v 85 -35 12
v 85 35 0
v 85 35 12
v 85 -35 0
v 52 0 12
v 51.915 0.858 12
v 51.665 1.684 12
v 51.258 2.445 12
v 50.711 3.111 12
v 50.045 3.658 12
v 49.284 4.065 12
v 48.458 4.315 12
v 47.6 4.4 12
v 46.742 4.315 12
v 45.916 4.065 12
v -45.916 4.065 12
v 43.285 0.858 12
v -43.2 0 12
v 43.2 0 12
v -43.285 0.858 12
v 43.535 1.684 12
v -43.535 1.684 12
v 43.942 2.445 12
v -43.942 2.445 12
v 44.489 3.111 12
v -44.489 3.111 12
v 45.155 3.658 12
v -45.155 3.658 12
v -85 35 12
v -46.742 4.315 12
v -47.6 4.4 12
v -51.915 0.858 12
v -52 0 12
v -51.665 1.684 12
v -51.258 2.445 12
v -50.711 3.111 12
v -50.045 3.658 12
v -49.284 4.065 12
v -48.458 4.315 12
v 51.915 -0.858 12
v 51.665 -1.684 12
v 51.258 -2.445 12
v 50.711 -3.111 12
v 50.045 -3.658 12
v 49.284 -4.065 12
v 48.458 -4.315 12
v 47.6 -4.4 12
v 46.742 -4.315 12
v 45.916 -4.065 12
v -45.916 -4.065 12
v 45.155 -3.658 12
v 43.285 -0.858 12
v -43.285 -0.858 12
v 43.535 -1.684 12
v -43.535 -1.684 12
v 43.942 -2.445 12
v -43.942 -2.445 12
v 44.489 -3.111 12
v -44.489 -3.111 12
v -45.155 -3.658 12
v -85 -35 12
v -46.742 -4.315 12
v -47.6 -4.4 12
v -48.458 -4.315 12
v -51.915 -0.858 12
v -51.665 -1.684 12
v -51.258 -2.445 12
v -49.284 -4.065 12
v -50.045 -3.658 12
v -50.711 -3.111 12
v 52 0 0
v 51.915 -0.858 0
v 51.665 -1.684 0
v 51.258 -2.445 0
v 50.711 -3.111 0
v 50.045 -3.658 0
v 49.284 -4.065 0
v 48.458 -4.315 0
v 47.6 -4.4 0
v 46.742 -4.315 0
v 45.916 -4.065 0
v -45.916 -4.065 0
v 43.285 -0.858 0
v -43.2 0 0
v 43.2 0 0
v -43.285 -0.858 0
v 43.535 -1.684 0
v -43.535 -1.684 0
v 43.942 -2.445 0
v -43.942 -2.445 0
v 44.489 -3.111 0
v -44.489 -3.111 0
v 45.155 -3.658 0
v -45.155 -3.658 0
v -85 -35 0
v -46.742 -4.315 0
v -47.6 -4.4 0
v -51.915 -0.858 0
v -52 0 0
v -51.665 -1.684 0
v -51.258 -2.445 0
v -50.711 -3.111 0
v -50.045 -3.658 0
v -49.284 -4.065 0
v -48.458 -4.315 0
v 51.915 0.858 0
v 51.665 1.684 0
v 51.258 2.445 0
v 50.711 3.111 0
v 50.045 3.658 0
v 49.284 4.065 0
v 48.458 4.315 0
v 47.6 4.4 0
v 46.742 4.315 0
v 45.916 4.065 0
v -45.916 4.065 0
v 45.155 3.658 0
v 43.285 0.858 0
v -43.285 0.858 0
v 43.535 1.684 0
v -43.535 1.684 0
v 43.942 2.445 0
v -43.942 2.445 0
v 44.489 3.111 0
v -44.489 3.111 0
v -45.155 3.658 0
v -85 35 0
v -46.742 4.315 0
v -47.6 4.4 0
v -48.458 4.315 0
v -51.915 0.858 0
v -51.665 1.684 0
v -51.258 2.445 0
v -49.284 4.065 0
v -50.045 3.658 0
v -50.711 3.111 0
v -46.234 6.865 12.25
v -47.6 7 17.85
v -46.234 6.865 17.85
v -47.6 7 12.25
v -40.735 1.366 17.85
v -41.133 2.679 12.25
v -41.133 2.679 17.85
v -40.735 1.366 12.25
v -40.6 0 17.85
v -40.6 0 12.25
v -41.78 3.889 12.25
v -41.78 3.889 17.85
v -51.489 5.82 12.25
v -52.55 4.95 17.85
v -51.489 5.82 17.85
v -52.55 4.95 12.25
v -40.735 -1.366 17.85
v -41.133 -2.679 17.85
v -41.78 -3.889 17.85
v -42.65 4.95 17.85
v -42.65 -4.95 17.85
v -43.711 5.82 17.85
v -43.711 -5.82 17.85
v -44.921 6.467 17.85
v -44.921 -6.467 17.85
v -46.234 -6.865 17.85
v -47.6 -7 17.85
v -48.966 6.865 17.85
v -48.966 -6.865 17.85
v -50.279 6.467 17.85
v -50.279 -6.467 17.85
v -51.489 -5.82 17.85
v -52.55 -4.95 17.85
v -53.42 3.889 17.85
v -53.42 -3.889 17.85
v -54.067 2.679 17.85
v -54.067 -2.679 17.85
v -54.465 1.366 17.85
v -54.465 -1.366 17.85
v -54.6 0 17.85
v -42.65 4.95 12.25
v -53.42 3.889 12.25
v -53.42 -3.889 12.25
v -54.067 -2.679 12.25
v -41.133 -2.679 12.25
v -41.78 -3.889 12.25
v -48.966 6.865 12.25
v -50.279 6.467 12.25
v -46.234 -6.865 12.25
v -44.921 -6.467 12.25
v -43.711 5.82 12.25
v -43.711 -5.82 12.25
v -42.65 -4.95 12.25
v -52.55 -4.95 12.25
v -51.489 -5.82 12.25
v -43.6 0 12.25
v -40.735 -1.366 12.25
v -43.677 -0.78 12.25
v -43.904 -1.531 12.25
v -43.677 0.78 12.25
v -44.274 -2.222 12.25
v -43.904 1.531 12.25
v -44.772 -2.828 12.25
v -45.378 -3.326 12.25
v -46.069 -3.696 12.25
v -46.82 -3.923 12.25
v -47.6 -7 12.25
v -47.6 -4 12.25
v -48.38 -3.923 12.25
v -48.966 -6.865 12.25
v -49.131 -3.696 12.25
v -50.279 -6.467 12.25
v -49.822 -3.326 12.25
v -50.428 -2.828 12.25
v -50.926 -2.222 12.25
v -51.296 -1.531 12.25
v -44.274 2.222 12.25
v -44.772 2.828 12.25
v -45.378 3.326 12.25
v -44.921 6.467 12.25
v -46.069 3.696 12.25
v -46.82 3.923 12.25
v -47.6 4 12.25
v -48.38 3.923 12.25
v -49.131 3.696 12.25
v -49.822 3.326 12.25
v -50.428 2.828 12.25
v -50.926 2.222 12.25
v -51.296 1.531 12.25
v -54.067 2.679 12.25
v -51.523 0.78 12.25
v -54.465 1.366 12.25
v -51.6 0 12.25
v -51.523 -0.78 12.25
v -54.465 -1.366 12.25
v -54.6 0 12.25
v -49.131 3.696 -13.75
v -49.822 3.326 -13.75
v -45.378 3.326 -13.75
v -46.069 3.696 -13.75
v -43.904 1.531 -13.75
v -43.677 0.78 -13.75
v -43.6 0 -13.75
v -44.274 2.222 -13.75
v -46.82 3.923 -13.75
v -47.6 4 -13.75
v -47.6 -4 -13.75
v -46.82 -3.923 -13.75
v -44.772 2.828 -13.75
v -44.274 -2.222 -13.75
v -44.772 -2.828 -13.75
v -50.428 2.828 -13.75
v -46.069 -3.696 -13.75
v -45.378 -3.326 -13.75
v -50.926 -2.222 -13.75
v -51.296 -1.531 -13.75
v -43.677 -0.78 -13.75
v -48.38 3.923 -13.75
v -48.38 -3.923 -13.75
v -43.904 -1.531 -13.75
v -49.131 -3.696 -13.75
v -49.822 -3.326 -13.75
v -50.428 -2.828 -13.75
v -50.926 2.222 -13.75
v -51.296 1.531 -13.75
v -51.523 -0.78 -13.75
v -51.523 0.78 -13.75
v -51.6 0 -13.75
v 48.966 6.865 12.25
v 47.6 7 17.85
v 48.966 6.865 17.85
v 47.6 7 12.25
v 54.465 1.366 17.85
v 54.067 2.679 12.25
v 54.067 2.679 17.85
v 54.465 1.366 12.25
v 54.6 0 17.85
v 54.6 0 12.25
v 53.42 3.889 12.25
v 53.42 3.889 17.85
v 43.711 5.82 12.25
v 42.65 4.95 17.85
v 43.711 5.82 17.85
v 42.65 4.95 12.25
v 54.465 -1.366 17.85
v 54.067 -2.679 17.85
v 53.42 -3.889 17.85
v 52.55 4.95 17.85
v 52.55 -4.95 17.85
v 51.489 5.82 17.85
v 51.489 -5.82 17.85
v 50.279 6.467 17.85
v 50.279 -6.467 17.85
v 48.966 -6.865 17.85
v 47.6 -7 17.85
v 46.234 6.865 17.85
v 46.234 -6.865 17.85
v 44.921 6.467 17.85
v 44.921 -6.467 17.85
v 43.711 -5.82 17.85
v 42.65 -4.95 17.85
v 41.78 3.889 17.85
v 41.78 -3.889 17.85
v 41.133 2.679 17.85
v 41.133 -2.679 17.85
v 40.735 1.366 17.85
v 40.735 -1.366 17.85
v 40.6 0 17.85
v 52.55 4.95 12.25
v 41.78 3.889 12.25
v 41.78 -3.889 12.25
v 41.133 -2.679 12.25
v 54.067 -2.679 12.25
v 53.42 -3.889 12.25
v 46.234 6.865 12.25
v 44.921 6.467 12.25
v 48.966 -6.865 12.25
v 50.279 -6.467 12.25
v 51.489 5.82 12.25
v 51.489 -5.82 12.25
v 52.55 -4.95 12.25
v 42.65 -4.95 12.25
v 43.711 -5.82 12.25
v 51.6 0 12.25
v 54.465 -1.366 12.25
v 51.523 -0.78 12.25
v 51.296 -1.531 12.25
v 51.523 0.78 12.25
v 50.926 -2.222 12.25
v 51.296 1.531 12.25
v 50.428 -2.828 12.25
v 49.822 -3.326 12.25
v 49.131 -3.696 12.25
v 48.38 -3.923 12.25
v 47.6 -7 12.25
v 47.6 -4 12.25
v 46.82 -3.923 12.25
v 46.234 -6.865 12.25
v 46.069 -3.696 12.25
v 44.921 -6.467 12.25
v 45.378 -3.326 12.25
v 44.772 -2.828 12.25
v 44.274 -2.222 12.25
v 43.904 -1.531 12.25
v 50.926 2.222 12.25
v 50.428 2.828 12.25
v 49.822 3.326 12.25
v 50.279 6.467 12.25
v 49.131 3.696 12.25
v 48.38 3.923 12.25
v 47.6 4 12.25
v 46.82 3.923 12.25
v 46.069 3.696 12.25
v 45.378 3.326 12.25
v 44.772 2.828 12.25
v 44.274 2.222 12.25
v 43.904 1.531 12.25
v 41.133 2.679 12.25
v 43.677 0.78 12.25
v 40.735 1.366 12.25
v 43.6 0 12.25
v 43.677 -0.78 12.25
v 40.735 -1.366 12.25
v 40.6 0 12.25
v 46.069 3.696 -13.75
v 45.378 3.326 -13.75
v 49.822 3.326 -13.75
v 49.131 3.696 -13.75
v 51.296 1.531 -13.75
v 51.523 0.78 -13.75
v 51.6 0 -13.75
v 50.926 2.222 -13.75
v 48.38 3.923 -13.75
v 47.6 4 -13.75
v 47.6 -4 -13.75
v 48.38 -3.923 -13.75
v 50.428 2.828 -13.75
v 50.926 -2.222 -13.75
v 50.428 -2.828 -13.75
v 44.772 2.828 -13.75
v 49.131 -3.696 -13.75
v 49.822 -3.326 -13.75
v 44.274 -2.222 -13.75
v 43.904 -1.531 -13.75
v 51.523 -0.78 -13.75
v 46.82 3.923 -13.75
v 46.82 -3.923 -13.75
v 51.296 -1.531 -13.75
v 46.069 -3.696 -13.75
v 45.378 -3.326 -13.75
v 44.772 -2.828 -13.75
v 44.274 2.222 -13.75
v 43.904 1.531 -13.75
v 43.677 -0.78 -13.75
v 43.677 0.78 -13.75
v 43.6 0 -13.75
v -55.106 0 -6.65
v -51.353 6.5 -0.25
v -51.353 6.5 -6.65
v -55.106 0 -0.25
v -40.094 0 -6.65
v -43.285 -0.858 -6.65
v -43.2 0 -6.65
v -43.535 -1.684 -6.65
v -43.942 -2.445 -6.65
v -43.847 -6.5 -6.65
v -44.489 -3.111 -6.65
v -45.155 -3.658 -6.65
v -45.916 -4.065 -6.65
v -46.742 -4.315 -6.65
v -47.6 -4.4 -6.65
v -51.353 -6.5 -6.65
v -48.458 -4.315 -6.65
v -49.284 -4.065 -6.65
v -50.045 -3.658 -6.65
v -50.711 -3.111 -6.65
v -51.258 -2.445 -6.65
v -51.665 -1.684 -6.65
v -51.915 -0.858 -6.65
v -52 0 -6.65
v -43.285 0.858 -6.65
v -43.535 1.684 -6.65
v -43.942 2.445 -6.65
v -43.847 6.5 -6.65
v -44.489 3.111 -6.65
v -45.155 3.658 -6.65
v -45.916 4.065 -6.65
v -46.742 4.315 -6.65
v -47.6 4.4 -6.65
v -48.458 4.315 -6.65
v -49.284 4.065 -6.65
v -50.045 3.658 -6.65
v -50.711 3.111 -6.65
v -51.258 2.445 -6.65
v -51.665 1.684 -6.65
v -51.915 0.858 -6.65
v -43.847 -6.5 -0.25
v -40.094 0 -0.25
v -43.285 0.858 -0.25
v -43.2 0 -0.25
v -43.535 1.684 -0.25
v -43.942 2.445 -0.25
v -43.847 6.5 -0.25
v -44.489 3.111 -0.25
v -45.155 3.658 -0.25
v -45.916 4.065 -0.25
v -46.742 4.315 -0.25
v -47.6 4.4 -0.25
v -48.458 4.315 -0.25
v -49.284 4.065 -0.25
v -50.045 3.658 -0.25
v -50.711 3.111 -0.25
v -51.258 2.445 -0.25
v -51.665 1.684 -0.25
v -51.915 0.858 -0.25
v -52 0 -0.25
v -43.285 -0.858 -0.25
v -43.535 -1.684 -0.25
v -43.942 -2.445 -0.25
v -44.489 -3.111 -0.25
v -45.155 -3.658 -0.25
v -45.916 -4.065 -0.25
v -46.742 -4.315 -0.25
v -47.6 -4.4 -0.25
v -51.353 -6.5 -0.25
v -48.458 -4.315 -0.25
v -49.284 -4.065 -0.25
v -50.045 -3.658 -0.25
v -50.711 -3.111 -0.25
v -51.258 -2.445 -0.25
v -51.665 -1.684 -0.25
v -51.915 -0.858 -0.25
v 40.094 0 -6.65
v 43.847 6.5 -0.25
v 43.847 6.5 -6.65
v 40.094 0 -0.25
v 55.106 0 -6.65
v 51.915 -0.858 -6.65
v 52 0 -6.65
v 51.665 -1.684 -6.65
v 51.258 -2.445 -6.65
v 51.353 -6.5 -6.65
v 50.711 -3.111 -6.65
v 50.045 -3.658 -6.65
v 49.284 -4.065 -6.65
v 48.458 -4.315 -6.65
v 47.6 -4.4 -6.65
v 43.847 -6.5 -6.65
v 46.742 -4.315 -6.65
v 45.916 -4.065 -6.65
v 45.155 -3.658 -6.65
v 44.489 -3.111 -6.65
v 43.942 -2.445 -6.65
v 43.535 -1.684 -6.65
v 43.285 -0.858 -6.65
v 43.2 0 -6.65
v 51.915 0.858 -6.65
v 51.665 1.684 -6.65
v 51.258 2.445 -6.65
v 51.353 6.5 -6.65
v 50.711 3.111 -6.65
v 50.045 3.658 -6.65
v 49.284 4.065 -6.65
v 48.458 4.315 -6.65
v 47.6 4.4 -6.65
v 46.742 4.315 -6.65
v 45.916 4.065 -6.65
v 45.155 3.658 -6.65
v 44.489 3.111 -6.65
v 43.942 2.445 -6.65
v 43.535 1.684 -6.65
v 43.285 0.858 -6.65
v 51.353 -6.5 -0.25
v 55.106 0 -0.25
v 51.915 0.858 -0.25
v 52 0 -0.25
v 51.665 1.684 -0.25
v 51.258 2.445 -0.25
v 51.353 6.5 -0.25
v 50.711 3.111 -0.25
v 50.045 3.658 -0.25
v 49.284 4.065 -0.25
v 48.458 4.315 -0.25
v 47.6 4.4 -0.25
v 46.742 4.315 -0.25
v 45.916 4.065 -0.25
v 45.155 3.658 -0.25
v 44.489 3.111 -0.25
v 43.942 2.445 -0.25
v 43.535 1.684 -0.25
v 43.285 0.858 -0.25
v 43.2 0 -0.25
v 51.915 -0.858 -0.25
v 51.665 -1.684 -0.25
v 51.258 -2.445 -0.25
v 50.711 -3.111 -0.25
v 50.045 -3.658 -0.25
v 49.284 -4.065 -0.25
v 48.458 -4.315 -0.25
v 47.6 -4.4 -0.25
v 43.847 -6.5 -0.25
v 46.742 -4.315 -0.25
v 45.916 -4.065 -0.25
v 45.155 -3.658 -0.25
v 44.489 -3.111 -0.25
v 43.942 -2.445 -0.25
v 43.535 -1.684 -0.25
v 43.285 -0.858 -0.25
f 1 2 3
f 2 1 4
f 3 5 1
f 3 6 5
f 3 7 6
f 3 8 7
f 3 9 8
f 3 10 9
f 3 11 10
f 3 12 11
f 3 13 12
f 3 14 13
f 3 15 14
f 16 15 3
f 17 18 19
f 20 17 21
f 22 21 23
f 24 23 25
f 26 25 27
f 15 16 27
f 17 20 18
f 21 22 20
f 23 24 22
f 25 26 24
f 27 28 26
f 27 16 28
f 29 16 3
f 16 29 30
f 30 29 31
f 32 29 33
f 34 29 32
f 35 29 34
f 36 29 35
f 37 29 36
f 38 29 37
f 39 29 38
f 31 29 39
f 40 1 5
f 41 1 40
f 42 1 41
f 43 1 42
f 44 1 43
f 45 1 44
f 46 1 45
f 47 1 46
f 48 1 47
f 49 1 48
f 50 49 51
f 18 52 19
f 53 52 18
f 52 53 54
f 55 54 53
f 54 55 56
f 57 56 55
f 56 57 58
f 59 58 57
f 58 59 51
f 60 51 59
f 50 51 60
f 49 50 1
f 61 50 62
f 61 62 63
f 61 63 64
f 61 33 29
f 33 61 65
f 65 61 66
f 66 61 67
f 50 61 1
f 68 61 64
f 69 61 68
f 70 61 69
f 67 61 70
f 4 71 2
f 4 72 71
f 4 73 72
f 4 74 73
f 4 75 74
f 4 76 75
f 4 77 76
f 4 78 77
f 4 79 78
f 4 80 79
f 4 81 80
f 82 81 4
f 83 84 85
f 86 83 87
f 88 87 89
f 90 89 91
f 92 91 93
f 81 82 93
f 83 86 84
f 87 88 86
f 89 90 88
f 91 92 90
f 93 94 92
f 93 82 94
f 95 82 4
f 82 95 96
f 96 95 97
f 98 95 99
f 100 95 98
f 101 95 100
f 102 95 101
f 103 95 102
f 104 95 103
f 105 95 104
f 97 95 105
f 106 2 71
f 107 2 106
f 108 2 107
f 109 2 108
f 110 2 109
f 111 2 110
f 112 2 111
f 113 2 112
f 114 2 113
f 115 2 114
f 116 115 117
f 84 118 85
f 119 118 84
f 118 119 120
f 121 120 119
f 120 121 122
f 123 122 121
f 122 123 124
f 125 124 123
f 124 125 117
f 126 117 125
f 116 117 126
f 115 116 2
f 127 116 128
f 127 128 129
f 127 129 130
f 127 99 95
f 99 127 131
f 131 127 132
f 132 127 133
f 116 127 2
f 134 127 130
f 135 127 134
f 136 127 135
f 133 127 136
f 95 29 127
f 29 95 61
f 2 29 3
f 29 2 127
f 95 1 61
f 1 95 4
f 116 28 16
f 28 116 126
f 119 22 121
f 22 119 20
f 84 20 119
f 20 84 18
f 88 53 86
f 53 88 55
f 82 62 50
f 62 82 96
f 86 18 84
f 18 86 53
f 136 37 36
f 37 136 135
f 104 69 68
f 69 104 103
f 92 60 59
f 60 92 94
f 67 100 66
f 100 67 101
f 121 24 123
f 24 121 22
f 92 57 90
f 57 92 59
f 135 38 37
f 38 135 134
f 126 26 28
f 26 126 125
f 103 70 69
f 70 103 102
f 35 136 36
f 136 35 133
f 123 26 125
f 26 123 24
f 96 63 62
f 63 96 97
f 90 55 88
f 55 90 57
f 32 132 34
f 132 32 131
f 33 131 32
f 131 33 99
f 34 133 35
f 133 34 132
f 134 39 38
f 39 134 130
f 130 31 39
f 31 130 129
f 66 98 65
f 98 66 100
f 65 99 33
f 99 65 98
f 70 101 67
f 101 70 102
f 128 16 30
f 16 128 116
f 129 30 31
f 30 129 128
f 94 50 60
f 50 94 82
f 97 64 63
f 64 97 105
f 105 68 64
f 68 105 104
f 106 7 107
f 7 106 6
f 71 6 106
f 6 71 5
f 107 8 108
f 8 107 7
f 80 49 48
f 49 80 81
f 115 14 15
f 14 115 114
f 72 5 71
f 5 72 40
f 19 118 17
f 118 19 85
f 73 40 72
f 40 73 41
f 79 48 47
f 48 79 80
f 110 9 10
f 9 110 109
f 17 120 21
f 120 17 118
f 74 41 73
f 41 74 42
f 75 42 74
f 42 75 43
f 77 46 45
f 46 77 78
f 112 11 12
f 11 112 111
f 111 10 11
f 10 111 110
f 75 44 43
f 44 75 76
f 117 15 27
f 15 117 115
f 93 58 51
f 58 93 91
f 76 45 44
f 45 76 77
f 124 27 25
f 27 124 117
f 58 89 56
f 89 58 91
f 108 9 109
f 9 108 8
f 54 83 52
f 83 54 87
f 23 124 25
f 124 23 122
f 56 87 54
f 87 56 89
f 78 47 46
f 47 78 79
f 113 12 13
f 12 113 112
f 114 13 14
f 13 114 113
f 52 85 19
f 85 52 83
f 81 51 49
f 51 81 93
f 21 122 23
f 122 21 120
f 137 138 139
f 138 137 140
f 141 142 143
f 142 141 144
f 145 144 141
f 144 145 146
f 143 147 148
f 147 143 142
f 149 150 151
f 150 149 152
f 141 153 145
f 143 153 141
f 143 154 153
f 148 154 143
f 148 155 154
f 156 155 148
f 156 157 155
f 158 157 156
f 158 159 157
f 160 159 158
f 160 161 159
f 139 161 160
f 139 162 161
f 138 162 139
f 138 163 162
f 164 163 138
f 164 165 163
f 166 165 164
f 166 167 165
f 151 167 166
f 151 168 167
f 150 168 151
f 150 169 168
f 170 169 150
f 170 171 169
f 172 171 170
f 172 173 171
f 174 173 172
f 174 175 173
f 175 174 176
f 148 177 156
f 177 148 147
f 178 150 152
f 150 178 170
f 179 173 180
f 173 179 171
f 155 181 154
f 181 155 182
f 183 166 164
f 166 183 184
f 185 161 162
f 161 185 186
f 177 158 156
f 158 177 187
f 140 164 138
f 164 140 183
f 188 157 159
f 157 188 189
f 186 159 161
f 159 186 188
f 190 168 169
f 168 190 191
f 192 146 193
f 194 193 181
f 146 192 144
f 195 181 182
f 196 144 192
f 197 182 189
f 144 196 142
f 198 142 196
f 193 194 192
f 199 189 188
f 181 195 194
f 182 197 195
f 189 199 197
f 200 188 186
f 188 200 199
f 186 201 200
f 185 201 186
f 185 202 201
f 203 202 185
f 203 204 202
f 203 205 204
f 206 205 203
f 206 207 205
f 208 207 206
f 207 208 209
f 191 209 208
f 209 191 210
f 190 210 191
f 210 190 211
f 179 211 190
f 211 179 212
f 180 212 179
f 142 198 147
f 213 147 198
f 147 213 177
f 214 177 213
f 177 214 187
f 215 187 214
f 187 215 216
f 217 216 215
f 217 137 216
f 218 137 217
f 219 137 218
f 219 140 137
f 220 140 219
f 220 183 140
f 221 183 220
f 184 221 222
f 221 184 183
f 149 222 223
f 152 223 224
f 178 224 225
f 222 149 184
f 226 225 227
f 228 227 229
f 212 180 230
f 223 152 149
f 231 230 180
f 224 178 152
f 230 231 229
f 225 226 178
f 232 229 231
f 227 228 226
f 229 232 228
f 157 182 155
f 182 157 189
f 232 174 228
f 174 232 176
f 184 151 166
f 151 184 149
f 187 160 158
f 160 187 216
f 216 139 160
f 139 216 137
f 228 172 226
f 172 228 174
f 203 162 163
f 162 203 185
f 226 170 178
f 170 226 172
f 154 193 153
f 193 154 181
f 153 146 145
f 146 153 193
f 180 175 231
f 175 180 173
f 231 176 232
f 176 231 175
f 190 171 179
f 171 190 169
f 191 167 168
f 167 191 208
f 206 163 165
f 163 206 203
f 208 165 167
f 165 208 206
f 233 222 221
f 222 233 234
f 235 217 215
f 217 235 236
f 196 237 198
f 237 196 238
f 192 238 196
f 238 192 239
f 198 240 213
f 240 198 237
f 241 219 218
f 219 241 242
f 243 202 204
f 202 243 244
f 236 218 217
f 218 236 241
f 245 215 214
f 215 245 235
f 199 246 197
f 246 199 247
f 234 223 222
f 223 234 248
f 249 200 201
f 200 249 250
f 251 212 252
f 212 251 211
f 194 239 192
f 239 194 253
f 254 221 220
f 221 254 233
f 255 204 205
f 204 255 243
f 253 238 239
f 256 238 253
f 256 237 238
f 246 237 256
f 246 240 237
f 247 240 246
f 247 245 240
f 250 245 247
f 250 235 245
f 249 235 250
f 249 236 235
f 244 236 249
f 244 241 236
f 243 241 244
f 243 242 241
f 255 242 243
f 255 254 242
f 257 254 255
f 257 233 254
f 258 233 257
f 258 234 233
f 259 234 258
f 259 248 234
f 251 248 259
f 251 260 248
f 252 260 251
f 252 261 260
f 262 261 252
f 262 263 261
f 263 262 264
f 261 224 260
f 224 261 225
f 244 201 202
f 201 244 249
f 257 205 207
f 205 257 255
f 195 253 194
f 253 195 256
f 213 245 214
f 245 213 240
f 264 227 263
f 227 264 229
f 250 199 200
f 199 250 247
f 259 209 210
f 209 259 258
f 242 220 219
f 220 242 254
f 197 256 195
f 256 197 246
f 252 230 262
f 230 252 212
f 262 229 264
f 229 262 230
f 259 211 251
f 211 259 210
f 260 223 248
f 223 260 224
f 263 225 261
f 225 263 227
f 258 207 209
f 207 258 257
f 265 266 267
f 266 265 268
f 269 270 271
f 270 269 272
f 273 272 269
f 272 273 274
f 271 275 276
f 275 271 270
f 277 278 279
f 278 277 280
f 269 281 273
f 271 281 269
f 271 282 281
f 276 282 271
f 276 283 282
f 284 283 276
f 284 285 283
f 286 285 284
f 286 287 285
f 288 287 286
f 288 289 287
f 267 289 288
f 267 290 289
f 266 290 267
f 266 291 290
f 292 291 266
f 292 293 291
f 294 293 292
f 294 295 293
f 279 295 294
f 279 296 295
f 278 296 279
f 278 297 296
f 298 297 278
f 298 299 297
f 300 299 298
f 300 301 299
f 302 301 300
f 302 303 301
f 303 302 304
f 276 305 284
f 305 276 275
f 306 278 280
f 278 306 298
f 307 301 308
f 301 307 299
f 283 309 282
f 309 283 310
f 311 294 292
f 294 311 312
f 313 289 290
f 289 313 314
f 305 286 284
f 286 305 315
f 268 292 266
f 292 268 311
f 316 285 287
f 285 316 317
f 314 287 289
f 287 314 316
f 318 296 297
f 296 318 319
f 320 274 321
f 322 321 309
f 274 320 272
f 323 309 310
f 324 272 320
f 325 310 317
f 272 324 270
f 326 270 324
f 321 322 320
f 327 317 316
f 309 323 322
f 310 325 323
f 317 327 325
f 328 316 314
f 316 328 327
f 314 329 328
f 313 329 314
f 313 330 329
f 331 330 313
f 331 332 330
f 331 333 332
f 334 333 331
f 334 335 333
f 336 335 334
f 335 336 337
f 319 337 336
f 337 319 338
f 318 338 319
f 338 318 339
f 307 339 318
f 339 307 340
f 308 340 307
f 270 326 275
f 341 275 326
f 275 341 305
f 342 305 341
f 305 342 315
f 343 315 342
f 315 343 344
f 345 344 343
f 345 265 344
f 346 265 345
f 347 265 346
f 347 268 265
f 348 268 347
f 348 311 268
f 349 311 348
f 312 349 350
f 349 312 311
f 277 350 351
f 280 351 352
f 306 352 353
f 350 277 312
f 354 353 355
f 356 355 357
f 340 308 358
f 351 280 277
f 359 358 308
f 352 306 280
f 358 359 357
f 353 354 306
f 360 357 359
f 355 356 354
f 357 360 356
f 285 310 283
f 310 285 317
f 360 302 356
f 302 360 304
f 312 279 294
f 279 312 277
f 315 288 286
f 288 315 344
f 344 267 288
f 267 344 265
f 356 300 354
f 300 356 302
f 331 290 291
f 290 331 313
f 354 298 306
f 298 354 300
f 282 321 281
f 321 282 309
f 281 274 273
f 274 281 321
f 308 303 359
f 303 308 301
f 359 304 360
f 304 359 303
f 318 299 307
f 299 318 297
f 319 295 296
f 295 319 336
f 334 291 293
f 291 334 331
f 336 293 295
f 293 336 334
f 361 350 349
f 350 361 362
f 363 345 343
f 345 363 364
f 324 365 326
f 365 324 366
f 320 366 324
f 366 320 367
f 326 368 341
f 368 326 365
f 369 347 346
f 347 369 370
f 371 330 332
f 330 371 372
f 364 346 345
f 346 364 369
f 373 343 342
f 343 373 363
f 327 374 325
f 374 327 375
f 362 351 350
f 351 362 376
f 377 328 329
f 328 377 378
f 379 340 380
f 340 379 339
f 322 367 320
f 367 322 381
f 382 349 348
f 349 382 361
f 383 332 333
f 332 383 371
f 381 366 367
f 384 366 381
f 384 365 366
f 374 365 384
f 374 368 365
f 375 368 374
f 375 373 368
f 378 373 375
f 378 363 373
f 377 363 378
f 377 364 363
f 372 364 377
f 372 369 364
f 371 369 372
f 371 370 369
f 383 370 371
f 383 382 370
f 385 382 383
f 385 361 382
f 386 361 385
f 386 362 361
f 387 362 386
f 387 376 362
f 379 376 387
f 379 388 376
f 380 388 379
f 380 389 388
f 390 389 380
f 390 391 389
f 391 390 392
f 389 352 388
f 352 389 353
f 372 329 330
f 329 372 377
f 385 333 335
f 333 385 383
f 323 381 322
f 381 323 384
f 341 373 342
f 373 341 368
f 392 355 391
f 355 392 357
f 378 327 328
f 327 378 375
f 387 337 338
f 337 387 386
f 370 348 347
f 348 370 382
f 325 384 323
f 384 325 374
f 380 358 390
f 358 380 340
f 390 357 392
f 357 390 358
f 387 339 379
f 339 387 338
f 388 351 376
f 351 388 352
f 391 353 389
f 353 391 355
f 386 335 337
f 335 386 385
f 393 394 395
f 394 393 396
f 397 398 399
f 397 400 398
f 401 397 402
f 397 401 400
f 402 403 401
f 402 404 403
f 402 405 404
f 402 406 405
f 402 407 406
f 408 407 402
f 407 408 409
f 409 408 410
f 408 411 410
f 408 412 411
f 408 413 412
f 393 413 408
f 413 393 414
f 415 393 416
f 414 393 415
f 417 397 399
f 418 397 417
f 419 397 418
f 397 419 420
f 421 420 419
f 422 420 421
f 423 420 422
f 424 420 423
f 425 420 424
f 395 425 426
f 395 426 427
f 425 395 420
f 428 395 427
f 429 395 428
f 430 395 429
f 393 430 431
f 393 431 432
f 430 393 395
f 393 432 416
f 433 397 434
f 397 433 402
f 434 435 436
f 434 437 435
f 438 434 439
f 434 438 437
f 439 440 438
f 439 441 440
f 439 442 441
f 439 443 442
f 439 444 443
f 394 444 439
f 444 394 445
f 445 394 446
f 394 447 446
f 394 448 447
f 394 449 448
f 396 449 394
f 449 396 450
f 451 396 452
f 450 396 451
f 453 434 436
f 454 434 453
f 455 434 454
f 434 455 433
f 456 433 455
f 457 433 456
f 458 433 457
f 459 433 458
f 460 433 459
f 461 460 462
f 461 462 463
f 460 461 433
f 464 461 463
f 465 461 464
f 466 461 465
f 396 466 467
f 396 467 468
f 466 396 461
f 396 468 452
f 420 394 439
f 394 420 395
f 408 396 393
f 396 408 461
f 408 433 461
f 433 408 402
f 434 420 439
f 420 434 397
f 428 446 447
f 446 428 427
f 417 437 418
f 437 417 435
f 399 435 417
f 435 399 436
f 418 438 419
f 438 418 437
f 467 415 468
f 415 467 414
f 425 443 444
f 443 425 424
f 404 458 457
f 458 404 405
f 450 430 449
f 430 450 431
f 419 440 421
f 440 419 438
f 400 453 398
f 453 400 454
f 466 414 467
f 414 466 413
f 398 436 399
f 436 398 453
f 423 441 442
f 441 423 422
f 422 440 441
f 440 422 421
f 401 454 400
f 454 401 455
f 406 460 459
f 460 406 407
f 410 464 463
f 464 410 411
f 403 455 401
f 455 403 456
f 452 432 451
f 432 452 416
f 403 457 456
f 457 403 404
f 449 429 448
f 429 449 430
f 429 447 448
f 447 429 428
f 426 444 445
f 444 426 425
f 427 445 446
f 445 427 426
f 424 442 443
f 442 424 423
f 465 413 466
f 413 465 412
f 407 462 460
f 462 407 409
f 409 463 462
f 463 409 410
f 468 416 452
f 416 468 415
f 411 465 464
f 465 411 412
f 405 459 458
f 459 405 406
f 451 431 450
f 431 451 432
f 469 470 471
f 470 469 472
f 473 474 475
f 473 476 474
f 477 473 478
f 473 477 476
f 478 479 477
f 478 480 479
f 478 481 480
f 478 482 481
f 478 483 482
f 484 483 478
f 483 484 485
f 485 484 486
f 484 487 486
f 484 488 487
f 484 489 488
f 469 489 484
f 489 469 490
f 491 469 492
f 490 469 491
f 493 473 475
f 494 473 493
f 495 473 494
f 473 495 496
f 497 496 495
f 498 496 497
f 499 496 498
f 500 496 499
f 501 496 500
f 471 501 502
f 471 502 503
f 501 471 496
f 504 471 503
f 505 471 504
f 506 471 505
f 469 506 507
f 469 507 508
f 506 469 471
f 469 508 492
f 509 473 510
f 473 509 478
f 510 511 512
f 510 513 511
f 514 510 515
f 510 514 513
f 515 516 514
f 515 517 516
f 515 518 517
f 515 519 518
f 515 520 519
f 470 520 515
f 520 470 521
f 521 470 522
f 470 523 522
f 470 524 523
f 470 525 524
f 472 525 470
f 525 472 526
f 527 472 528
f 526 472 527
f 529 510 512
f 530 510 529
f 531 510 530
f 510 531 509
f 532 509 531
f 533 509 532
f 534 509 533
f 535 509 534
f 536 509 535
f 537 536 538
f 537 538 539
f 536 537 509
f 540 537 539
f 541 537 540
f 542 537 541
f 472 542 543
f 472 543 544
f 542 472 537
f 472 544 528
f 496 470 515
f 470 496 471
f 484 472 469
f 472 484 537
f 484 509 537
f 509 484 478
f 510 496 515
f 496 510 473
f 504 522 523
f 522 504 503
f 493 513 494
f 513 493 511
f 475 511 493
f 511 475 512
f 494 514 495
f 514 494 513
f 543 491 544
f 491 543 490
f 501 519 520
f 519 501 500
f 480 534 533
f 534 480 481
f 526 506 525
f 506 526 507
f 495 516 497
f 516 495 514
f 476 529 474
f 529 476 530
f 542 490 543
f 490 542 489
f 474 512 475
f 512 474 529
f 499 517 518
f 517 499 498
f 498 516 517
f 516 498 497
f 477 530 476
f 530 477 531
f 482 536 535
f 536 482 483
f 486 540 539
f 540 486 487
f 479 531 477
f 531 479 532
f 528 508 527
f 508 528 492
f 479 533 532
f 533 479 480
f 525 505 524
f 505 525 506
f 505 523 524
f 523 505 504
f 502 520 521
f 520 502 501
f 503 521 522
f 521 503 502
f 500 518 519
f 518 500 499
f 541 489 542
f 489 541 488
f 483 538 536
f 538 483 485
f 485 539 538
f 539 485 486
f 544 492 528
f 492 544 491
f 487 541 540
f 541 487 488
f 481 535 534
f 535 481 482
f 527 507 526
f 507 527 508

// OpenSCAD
$fn = 32;

// ------------------------------------------------------------------------
// Bolted plate: 170 x 70 x 12 mm plate, 2 fasteners
// Every part is its own module, assembly() places them once.
// ------------------------------------------------------------------------

// --- part 1 ---
module plate() {
  difference() {
    translate([-85, -35, 0]) cube([170, 70, 12]);
    translate([-47.6, 0, -1]) cylinder(h = 14, d = 8.8);
    translate([47.6, 0, -1]) cylinder(h = 14, d = 8.8);
  }
}

// --- part 2 ---
module bolt1() {
  cylinder(h = 5.6, d = 14);
  translate([0, 0, -26]) cylinder(h = 26, d = 8);
}

// --- part 3 ---
module bolt2() {
  cylinder(h = 5.6, d = 14);
  translate([0, 0, -26]) cylinder(h = 26, d = 8);
}

// --- part 4 ---
module nut1() {
  difference() {
    linear_extrude(height = 6.4) polygon(points = [[7.506, 0], [3.753, 6.5], [-3.753, 6.5], [-7.506, 0], [-3.753, -6.5], [3.753, -6.5]]);
    translate([0, 0, -1]) cylinder(h = 8.4, d = 8.8);
  }
}

// --- part 5 ---
module nut2() {
  difference() {
    linear_extrude(height = 6.4) polygon(points = [[7.506, 0], [3.753, 6.5], [-3.753, 6.5], [-7.506, 0], [-3.753, -6.5], [3.753, -6.5]]);
    translate([0, 0, -1]) cylinder(h = 8.4, d = 8.8);
  }
}

// --- assembly ---
module assembly() {
  translate([0, 0, 0]) rotate([0, 0, 0]) plate();
  translate([-47.6, 0, 12.25]) rotate([0, 0, 0]) bolt1();
  translate([47.6, 0, 12.25]) rotate([0, 0, 0]) bolt2();
  translate([-47.6, 0, -6.65]) rotate([0, 0, 0]) nut1();
  translate([47.6, 0, -6.65]) rotate([0, 0, 0]) nut2();
}

assembly();
